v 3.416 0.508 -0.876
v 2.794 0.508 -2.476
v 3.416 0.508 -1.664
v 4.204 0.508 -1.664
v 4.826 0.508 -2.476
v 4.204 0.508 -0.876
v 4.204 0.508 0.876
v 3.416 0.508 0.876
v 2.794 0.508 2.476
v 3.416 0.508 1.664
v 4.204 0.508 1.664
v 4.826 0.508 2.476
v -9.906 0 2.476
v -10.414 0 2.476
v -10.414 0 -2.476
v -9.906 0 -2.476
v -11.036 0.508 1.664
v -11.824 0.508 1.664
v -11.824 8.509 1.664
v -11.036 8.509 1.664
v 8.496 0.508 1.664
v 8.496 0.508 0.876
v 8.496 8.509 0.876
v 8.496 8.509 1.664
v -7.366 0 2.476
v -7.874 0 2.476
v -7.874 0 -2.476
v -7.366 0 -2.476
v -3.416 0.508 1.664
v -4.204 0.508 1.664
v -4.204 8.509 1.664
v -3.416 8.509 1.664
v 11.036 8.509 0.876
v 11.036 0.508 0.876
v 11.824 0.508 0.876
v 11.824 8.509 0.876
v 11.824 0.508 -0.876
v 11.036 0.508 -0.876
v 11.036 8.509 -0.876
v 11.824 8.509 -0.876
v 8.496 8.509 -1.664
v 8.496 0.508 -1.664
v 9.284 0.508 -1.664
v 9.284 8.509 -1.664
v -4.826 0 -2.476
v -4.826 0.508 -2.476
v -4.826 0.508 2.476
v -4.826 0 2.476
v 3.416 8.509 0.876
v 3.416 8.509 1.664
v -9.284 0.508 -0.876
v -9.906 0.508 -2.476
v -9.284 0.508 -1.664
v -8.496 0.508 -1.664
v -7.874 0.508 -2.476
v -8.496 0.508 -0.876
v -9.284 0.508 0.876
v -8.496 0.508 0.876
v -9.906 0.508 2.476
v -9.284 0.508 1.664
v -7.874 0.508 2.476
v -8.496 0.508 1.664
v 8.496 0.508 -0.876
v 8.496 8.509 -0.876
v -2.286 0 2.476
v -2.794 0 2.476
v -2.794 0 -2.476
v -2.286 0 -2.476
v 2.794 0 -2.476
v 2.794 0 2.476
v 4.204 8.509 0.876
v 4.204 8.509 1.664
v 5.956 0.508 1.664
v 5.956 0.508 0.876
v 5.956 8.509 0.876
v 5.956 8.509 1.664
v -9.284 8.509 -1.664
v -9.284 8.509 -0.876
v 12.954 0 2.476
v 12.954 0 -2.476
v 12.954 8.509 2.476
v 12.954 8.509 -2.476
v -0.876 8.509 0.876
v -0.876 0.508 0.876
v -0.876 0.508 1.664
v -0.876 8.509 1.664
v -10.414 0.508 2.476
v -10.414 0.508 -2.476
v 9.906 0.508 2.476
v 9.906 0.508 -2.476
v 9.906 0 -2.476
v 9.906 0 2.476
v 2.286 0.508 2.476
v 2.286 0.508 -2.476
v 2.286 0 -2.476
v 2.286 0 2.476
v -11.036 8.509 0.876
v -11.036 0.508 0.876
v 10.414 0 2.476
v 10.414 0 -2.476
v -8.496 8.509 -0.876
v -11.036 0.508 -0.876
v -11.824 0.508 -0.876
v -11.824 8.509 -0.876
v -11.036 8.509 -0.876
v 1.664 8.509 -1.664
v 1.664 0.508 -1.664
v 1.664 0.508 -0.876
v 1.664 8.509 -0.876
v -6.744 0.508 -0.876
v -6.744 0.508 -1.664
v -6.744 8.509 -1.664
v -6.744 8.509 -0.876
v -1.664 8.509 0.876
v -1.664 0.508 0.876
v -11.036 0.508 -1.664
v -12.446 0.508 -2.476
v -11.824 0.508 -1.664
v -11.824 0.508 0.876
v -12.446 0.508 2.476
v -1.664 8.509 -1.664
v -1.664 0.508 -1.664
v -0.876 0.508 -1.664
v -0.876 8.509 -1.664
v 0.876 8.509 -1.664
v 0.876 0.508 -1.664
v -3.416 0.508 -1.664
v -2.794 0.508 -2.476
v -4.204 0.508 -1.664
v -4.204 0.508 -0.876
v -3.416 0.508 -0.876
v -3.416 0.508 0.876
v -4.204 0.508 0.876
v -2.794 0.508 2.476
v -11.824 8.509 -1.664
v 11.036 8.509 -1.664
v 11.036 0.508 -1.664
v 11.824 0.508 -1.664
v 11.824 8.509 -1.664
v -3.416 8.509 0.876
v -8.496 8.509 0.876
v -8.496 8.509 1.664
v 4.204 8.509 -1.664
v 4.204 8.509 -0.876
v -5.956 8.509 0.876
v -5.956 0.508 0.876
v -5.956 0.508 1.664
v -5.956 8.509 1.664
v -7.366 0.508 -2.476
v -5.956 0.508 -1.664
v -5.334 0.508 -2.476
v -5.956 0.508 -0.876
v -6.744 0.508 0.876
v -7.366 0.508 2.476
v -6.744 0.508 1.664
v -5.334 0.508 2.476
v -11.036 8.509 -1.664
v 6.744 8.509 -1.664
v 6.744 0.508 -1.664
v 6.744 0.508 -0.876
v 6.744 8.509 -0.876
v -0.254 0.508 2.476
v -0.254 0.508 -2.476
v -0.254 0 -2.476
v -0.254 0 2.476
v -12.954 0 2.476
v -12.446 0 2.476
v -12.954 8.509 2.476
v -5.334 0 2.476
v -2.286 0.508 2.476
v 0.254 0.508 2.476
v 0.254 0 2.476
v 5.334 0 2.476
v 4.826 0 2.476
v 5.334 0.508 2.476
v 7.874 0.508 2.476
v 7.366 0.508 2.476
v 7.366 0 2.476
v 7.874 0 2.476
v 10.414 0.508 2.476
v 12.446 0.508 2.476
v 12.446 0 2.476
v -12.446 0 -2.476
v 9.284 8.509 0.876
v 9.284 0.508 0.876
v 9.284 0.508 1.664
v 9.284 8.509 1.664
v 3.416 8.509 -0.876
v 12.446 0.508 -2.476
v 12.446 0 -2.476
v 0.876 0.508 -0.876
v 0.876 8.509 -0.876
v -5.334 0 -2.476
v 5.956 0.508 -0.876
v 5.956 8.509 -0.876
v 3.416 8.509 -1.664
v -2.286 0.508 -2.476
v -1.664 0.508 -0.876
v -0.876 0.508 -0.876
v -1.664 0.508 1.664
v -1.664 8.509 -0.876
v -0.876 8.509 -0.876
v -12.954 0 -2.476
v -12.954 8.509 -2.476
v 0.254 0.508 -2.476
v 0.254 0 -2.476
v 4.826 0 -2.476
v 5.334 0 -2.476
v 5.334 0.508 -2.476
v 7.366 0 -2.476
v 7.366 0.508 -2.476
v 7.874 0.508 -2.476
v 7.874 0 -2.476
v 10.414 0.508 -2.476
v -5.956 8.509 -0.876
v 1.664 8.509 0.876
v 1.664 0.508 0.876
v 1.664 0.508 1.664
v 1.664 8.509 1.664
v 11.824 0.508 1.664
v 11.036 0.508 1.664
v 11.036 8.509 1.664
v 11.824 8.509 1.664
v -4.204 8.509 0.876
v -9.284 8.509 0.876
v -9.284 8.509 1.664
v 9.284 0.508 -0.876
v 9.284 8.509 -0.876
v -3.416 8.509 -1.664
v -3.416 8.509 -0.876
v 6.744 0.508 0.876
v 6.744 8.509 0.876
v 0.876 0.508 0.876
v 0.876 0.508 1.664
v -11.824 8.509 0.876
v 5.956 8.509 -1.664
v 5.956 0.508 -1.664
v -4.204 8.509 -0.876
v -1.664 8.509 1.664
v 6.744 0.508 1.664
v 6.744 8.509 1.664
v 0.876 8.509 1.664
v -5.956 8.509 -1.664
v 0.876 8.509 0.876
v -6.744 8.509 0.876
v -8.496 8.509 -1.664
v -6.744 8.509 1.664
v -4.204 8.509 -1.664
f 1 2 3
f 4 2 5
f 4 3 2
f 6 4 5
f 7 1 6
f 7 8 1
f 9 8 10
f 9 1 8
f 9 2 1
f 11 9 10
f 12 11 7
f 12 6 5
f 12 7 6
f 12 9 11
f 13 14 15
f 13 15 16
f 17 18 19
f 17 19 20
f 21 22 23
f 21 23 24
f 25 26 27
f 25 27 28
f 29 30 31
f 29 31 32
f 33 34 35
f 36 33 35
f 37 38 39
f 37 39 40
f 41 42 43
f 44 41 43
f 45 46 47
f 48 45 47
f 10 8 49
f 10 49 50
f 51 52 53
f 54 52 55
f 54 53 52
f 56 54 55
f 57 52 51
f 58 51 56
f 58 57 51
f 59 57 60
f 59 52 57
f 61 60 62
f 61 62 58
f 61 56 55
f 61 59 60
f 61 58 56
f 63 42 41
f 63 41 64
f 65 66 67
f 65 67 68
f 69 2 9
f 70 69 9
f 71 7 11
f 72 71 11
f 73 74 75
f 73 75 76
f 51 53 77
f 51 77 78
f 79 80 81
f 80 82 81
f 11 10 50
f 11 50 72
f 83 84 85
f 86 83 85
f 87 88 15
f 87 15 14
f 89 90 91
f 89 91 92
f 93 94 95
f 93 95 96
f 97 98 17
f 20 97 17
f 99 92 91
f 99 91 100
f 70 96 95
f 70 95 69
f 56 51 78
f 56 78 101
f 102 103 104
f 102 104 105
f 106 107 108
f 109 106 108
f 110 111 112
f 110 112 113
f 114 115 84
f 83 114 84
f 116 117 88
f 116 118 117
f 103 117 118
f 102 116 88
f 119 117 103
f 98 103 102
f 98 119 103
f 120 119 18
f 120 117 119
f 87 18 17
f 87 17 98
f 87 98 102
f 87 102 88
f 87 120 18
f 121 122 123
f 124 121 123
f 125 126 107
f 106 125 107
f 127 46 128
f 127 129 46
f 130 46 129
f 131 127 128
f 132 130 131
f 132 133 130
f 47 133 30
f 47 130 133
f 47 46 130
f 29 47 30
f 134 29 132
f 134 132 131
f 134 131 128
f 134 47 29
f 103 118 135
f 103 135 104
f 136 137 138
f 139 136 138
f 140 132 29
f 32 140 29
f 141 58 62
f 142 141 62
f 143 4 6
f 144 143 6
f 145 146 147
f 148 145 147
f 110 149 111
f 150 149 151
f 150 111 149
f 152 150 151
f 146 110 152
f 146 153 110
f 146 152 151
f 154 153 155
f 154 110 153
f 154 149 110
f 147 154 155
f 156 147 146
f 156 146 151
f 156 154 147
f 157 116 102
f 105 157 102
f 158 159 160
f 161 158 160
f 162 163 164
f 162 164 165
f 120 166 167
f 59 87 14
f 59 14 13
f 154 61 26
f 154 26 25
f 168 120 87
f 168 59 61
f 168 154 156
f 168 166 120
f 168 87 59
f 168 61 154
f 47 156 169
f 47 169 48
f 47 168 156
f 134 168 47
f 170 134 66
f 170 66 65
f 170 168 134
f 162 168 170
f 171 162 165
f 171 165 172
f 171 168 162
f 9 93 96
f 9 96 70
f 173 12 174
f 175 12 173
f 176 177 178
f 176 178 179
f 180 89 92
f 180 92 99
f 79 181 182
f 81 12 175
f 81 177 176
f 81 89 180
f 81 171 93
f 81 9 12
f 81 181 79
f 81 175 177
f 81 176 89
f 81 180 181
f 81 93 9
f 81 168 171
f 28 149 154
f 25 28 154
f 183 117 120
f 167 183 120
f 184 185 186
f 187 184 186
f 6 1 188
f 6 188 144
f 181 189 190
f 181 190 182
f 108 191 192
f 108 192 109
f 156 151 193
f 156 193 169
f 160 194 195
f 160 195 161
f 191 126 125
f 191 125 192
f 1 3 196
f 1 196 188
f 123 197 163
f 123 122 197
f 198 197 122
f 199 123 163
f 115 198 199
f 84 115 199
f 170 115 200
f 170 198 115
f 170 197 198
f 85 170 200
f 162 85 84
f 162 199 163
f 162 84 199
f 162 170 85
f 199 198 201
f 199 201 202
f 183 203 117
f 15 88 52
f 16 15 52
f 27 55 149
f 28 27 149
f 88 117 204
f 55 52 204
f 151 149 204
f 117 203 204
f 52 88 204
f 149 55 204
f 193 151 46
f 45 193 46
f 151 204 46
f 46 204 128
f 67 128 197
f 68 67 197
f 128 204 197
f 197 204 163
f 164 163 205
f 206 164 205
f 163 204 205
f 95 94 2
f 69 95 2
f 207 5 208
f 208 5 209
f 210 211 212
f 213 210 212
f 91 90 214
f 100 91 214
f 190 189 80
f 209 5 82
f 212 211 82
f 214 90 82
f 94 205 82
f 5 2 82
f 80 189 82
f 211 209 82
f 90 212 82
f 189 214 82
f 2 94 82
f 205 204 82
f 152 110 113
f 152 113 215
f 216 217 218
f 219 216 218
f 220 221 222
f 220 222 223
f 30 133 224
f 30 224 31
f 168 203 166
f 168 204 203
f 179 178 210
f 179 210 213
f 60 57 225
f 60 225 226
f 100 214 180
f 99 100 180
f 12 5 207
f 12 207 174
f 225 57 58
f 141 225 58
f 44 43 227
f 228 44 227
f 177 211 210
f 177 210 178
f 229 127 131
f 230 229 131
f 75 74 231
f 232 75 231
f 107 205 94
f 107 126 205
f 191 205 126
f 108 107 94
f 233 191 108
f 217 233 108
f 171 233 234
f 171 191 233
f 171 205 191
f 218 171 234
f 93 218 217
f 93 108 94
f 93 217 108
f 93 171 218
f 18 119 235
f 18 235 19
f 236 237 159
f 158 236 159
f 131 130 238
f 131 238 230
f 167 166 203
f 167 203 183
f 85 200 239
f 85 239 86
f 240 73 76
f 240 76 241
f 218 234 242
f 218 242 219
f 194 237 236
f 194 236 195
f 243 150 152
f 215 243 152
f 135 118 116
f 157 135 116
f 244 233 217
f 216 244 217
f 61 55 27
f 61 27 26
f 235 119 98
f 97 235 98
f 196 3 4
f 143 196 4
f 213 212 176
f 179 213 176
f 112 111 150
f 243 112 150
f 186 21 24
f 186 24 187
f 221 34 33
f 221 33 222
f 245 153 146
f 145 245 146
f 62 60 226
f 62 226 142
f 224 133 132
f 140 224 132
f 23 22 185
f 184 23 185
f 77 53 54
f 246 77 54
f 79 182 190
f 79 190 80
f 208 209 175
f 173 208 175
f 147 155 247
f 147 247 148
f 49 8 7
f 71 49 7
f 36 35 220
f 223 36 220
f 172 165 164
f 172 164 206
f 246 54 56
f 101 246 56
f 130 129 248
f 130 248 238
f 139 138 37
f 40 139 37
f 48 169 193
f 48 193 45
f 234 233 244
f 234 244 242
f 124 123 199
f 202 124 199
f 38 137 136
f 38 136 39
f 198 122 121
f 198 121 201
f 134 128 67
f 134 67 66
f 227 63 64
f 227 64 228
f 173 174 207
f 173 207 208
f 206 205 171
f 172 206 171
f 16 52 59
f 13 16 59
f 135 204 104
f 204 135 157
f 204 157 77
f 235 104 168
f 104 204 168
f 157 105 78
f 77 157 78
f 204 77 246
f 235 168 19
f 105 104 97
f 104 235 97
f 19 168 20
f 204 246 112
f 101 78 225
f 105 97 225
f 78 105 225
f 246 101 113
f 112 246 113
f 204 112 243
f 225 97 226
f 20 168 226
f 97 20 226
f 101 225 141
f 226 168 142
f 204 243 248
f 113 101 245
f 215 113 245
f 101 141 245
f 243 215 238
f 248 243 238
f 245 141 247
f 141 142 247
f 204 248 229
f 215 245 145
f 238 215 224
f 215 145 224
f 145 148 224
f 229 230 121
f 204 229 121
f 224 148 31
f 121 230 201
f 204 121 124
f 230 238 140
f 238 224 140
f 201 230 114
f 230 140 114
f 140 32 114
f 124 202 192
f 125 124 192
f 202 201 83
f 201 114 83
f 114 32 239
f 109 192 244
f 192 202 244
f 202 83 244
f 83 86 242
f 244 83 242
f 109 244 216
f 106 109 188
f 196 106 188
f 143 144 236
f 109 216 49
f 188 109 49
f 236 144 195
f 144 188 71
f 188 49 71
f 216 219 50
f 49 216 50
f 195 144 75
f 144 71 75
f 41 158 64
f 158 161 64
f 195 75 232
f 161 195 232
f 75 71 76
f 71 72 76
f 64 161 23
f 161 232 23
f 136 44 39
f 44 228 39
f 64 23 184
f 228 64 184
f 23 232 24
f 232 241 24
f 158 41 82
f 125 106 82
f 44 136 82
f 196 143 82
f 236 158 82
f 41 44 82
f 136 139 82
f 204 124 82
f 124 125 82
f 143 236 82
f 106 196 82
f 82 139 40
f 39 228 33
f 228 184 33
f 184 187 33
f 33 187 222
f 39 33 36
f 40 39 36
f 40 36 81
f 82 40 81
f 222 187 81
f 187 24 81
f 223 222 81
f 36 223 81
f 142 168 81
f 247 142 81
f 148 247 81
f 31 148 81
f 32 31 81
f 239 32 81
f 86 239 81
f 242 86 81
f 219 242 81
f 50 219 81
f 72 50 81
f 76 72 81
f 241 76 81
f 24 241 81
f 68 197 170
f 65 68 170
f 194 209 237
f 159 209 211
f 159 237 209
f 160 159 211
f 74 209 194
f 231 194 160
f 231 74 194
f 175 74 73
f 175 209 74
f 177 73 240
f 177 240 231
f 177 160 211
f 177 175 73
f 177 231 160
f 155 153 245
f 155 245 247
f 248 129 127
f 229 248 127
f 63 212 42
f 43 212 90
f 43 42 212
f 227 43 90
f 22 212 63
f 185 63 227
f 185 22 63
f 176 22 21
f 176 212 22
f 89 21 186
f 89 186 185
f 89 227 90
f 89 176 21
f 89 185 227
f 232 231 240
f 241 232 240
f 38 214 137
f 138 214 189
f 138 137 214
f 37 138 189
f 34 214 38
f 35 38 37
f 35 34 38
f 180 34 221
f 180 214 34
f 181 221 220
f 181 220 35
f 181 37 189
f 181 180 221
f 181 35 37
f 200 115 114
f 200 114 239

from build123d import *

# Parameters (mm, degrees)
SKETCH1_W            = 25.908
SKETCH1_H            = 8.001
BOSS_EXTRUDE1_DEPTH  = 4.953
SKETCH2_W            = 0.7874
SKETCH2_H            = 0.7874
CUT_EXTRUDE1_DEPTH   = 9.001
LPATTERN1_COUNT      = 2
LPATTERN1_PITCH      = 2.54
LPATTERN1_COUNT_DIR2 = 10
LPATTERN1_PITCH_DIR2 = 2.54
SKETCH3_W            = 0.508
SKETCH3_H            = 4.953
BOSS_EXTRUDE2_DEPTH  = 0.508
LPATTERN2_COUNT      = 11
LPATTERN2_PITCH      = 2.54


with BuildPart() as part:
    # Sketch1 → Boss-Extrude1 (new body)
    with BuildSketch(Plane.XY.offset(2.4765)):
        with Locations((0, 4.5085)):
            Rectangle(SKETCH1_W, SKETCH1_H)
    extrude(amount=-BOSS_EXTRUDE1_DEPTH)

    # Sketch2 → Cut-Extrude1 (cut, through all)
    with BuildSketch(Plane.XZ.offset(-0.508)):
        with Locations((11.43, -1.27)):
            Rectangle(SKETCH2_W, SKETCH2_H)
    cut_extrude1 = extrude(amount=-CUT_EXTRUDE1_DEPTH, mode=Mode.SUBTRACT)

    # LPattern1: Cut-Extrude1 2 × 10
    with Locations(*[(-j * LPATTERN1_PITCH_DIR2, 0, i * LPATTERN1_PITCH) for i in range(LPATTERN1_COUNT) for j in range(LPATTERN1_COUNT_DIR2) if (i, j) != (0, 0)]):
        add(cut_extrude1, mode=Mode.SUBTRACT)

    # Sketch3 → Boss-Extrude2 (add)
    with BuildSketch(Plane.XZ.offset(-0.508)):
        with Locations((-12.7, 0)):
            Rectangle(SKETCH3_W, SKETCH3_H)
    boss_extrude2 = extrude(amount=BOSS_EXTRUDE2_DEPTH)

    # LPattern2: Boss-Extrude2 ×11
    with Locations(*[(i * LPATTERN2_PITCH, 0, 0) for i in range(1, LPATTERN2_COUNT)]):
        add(boss_extrude2)


solid = part.part
